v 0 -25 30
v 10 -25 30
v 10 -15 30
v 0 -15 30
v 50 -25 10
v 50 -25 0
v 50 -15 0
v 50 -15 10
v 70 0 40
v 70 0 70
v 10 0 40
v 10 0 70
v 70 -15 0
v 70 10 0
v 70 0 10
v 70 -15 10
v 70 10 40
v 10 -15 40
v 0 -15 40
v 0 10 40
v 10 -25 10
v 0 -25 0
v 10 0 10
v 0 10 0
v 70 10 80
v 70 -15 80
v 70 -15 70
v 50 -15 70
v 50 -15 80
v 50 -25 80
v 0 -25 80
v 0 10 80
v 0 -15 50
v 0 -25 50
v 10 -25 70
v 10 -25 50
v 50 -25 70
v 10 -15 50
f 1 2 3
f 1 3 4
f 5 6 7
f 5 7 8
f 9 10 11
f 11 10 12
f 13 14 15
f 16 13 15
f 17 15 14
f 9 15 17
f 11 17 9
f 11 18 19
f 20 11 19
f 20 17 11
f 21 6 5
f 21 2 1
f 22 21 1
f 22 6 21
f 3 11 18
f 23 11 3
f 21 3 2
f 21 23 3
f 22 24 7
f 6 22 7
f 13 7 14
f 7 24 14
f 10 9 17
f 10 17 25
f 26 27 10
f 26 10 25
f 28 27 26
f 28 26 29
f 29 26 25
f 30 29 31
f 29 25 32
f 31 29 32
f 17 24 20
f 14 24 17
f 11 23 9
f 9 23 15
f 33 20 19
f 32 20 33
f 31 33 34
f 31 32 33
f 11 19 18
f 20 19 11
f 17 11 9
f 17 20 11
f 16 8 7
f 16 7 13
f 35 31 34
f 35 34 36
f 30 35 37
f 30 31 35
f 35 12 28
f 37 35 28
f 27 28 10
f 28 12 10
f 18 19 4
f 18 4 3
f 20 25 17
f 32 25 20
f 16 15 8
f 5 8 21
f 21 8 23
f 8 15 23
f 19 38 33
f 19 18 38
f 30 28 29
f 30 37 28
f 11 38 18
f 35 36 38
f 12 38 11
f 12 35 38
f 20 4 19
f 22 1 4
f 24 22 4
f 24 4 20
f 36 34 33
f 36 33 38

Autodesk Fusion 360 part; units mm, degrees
sketch "Sketch1" plane through (0, 0, 0) normal (0, 1, 0) x (1, 0, 0)
  line L0 (0, 0) -> (70, 0)
  line L1 (70, 0) -> (70, -40)
  line L2 (70, -40) -> (0, -40)
  line L3 (0, -40) -> (0, 0)
extrude "Extrude1" add sketch "Sketch1" along normal blind 10 makes body 1
sketch "Sketch2" plane through (0, 0, 0) normal (0, 1, 0) x (1, 0, 0)
  line L0 (0, 0) -> (70, 0)
  line L1 (70, 0) -> (70, -10)
  line L2 (70, -10) -> (0, -10)
  line L3 (0, -10) -> (0, 0)
  line L4 (70, -40) -> (70, 0)
extrude "Extrude2" add sketch "Sketch2" against normal blind 25 bodies 1
sketch "Sketch3" plane through (0, 0, 0) normal (0, 0, 1) x (1, 0, 0)
  line L0 (10, -25) -> (0, -25)
  line L1 (0, -25) -> (0, 10)
  line L2 (0, 10) -> (10, 10)
  line L3 (10, 10) -> (10, -25)
  line L4 (0, -25) -> (70, -25)
extrude "Extrude3" cut sketch "Sketch3" along normal blind 40 bodies 1
sketch "Sketch4" plane through (0, 0, 0) normal (0, 1, 0) x (1, 0, 0)
extrude "Extrude4" add sketch "Sketch3" along normal blind 40 bodies 1
sketch "Sketch5" plane through (0, 0, 0) normal (0, 1, 0) x (1, 0, 0)
  line L0 (0, -30) -> (10, -30)
  line L1 (10, -30) -> (10, -40)
  line L2 (10, -40) -> (0, -40)
  line L3 (0, -40) -> (0, -30)
  line L4 (0, -40) -> (0, 0)
sketch "Sketch6" plane through (0, -25, 0) normal (0, -1, 0) x (1, 0, 0)
  line L0 (0, 0) -> (70, 0)
  line L1 (70, 0) -> (70, 10)
  line L2 (70, 10) -> (10, 10)
  line L3 (10, 10) -> (10, 40)
  line L4 (10, 40) -> (0, 40)
  line L5 (0, 40) -> (0, 0)
  line L6 (0, 40) -> (10, 40)
  line L7 (10, 40) -> (10, 30)
  line L8 (10, 30) -> (0, 30)
  line L9 (0, 30) -> (0, 40)
extrude "Extrude5" cut sketch "Sketch6" against normal blind 10 contours L3 L4 L5 L6 L7 L8 L9 bodies 1
sketch "Sketch7" plane through (0, 0, 0) normal (0, 1, 0) x (1, 0, 0)
  line L0 (50, -10) -> (70, -10)
  line L1 (70, -10) -> (70, 0)
  line L2 (70, 0) -> (50, 0)
  line L3 (50, 0) -> (50, -10)
  line L4 (10, -10) -> (70, -10)
sketch "Sketch8" plane through (0, -25, 0) normal (0, -1, 0) x (1, 0, 0)
  line L0 (10, 30) -> (0, 30)
  line L1 (0, 30) -> (0, 0)
  line L2 (0, 0) -> (70, 0)
  line L3 (70, 0) -> (70, 10)
  line L4 (70, 10) -> (10, 10)
  line L5 (10, 10) -> (10, 30)
  line L6 (70, 0) -> (50, 0)
  line L7 (50, 0) -> (50, 10)
  line L8 (50, 10) -> (70, 10)
  line L9 (70, 10) -> (70, 0)
extrude "Extrude6" cut sketch "Sketch8" against normal blind 10 contours L2 L3 L4 L6 L7 L8 L9 bodies 1
mirror "Mirror1" about plane through (0, 0, 40) normal (0, 0, 1) of bodies 1 makes body 2
